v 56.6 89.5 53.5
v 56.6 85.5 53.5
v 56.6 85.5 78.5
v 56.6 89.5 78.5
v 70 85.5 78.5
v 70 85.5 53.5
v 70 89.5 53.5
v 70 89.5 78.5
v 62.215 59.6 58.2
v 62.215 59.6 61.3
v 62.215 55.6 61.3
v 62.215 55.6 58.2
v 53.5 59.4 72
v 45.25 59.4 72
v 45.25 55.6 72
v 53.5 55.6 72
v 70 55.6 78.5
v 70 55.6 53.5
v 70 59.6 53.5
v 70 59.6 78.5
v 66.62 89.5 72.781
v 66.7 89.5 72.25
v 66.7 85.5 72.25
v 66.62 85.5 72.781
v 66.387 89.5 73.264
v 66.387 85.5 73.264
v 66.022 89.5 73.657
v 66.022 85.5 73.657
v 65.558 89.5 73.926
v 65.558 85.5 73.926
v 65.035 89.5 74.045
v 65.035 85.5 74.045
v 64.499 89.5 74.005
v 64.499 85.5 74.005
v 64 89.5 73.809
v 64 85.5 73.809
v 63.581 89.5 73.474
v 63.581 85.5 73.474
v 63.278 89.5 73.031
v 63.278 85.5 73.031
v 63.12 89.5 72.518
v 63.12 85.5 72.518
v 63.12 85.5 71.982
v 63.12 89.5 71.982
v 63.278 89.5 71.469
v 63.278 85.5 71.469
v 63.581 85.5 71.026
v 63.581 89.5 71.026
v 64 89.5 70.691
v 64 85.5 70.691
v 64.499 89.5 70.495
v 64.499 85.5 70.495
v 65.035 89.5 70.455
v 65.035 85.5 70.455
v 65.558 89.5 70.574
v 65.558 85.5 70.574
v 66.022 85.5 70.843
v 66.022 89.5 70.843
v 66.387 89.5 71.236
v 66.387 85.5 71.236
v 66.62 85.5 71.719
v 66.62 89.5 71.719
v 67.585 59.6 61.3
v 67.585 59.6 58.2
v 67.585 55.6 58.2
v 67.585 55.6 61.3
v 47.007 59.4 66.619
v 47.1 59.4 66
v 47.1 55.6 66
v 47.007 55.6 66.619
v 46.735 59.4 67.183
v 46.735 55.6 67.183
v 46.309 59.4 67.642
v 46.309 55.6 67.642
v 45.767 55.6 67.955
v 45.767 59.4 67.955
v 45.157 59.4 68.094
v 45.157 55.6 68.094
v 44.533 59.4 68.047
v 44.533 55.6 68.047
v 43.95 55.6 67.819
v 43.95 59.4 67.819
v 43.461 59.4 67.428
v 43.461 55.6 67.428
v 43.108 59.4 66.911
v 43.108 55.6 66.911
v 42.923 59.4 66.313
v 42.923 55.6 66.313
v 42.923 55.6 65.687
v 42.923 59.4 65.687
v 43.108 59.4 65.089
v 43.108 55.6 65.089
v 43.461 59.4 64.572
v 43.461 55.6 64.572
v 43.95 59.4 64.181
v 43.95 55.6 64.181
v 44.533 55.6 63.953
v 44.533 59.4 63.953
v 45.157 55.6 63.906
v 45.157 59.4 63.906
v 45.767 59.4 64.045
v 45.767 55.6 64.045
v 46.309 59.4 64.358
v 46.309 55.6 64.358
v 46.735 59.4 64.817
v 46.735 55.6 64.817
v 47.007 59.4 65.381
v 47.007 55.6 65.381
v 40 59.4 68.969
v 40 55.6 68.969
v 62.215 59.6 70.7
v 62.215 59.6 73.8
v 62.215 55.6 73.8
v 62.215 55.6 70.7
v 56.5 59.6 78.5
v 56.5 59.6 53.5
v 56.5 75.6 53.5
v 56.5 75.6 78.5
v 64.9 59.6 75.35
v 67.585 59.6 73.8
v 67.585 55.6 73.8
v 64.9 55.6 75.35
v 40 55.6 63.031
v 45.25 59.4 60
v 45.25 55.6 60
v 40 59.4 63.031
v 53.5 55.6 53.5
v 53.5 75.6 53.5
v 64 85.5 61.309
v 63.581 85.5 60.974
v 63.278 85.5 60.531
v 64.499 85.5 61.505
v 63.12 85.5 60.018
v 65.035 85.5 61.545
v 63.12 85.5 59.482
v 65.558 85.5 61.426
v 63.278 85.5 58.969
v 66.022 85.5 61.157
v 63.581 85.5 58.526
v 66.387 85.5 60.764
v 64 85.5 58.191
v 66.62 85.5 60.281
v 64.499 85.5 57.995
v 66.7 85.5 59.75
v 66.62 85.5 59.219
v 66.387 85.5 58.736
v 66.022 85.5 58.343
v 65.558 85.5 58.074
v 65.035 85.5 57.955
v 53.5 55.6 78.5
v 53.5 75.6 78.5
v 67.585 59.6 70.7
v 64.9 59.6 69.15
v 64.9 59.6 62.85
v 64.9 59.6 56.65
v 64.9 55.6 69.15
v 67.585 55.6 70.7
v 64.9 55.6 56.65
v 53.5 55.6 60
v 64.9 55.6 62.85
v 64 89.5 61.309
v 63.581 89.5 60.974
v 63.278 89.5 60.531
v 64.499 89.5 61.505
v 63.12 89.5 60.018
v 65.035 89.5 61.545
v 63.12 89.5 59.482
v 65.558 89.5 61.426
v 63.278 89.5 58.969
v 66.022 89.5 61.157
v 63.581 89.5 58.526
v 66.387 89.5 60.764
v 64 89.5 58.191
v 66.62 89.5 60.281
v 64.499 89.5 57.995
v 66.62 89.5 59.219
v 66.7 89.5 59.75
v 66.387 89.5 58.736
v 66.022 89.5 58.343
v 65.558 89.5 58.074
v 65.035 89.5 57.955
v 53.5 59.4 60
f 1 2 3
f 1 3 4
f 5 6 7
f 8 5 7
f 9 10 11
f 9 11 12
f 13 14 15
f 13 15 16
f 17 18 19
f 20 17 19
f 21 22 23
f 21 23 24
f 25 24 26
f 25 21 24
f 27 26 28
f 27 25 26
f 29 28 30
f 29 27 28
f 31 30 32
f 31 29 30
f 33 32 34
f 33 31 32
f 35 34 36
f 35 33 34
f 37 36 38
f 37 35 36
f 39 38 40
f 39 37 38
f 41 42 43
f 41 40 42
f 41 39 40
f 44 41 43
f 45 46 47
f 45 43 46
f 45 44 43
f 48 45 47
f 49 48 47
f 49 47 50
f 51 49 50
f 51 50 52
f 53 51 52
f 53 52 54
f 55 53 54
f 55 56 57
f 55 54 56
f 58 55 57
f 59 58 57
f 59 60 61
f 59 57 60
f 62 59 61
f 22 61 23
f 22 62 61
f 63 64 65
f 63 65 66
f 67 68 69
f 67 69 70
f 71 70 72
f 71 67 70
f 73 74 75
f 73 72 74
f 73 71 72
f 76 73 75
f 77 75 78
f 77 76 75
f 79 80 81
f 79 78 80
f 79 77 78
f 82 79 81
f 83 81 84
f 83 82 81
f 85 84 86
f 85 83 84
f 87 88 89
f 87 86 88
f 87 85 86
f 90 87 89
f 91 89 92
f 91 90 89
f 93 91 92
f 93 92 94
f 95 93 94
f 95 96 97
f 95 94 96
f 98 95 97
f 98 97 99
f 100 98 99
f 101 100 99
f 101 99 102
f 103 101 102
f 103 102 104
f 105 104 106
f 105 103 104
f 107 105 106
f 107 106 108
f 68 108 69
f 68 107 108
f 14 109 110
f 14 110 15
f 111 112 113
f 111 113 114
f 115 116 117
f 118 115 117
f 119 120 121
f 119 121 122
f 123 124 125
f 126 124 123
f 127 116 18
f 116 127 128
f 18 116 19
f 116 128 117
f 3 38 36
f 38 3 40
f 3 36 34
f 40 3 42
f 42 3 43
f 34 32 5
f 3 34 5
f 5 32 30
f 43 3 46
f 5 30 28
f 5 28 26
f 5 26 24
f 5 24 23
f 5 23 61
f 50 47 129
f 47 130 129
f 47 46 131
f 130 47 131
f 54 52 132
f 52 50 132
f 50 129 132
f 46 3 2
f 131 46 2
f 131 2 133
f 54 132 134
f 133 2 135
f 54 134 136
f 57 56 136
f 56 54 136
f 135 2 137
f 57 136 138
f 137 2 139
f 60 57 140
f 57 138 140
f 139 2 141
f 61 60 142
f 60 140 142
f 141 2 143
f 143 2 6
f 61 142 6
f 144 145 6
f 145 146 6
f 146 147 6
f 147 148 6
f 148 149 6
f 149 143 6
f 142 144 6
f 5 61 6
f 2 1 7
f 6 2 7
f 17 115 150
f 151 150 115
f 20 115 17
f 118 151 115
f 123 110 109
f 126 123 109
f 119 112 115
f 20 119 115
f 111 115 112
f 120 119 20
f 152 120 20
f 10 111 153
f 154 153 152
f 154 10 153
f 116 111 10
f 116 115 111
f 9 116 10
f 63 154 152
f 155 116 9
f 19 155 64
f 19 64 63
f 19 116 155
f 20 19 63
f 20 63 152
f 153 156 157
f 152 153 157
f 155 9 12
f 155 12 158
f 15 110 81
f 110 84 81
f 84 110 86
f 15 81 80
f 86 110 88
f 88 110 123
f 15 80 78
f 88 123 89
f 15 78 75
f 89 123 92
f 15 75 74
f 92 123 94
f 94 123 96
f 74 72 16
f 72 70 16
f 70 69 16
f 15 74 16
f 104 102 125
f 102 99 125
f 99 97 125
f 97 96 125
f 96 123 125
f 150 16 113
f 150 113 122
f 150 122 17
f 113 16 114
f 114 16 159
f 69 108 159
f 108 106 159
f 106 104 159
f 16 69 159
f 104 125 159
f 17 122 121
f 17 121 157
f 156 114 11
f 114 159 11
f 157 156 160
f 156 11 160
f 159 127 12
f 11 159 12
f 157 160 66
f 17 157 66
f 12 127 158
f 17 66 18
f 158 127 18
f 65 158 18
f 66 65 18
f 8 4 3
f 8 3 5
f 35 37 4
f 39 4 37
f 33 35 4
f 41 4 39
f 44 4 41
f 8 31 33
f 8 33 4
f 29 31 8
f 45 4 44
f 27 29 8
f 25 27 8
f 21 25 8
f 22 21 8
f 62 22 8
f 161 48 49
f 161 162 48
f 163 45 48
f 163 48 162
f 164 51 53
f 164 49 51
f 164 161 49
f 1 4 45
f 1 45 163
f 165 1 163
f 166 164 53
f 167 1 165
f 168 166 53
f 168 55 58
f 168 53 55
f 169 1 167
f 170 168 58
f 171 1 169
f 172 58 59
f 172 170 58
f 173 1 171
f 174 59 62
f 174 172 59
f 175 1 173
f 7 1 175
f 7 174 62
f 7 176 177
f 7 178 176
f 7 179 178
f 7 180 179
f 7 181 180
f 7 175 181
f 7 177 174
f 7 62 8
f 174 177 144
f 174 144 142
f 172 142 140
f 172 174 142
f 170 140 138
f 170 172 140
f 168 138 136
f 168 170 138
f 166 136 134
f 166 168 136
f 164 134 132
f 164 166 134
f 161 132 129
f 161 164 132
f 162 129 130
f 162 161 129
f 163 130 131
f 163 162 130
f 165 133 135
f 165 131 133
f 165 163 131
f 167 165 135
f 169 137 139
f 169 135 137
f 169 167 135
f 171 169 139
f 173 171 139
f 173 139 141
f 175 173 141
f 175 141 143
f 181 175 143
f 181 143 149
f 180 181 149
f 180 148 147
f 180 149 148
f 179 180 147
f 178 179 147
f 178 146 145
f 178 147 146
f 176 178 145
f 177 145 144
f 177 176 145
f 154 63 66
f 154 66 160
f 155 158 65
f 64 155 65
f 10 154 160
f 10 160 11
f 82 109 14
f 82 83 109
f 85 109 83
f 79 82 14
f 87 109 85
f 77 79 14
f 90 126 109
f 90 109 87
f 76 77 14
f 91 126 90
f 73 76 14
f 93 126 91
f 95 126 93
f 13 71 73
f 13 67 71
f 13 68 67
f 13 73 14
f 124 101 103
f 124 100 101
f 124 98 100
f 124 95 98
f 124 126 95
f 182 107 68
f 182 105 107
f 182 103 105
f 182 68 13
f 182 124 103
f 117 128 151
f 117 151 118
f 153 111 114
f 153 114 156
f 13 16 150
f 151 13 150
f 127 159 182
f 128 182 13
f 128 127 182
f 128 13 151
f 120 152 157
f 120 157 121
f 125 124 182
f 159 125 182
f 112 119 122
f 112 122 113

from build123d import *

# Parameters (mm, degrees)
PRISM018_DEPTH       = 13
PRISM019_DEPTH       = 13
PRISM020_DEPTH       = 6
PRISM020_ROLL_ANGLE  = 90
PRISM020_PITCH_ANGLE = 30.000006
CYLINDER016_R        = 1.8
CYLINDER016_DEPTH    = 6
PRISM021_DEPTH       = 6
PRISM021_ROLL_ANGLE  = 90
PRISM021_PITCH_ANGLE = 30.000006
CYLINDER017_R        = 1.8
CYLINDER017_DEPTH    = 6
CYLINDER015_R        = 2.1
CYLINDER015_DEPTH    = 13
CUBE025_W            = 3
CUBE025_H            = 20
CUBE025_DEPTH        = 25
CUBE026_W            = 15
CUBE026_H            = 4
CUBE026_DEPTH        = 25
CUBE027_W            = 13.4
CUBE027_H            = 4
CUBE027_DEPTH        = 25
CUBE024_W            = 15
CUBE024_H            = 3.8
CUBE024_DEPTH        = 12


with BuildPart() as prism018:
    # prism018 → prism018 (new body)
    with BuildSketch(Plane(origin=(40, 64, 72), x_dir=(1, 0, 0), z_dir=(0, -1, 0))):
        Polygon((5.25, 0), (-2.625, 4.546633), (-2.625, -4.546633), align=None)
    extrude(amount=PRISM018_DEPTH)


with BuildPart() as prism019:
    # prism019 → prism019 (new body)
    with BuildSketch(Plane(origin=(40, 64, 60), x_dir=(1, 0, 0), z_dir=(0, -1, 0))):
        Polygon((5.25, 0), (-2.625, 4.546633), (-2.625, -4.546633), align=None)
    extrude(amount=PRISM019_DEPTH)


with BuildPart() as prism020:
    # prism020 → prism020 (new body)
    with BuildSketch(Plane.XY):
        Polygon((3.1, 0), (1.55, 2.684679), (-1.55, 2.684679), (-3.1, 0), (-1.55, -2.684679), (1.55, -2.684679), align=None)
    extrude(amount=PRISM020_DEPTH)


with BuildPart() as prism020_1:
    # prism020 roll: moved
    add(prism020.part.rotate(Axis((0, 0, 0), (1, 0, 0)), PRISM020_ROLL_ANGLE))


with BuildPart() as prism020_2:
    # prism020 pitch: moved
    add(prism020_1.part.rotate(Axis((0, 0, 0), (0, 1, 0)), PRISM020_PITCH_ANGLE))


with BuildPart() as prism020_3:
    # prism020 placement: moved
    add(prism020_2.part.moved(Location((64.9, 60.499999, 72.25))))


with BuildPart() as cylinder016:
    # cylinder016 → cylinder016 (new body)
    with BuildSketch(Plane(origin=(64.9, 90.5, 72.25), x_dir=(1, 0, 0), z_dir=(0, -1, 0))):
        Circle(CYLINDER016_R)
    extrude(amount=CYLINDER016_DEPTH)


with BuildPart() as prism021:
    # prism021 → prism021 (new body)
    with BuildSketch(Plane.XY):
        Polygon((3.1, 0), (1.55, 2.684679), (-1.55, 2.684679), (-3.1, 0), (-1.55, -2.684679), (1.55, -2.684679), align=None)
    extrude(amount=PRISM021_DEPTH)


with BuildPart() as prism021_1:
    # prism021 roll: moved
    add(prism021.part.rotate(Axis((0, 0, 0), (1, 0, 0)), PRISM021_ROLL_ANGLE))


with BuildPart() as prism021_2:
    # prism021 pitch: moved
    add(prism021_1.part.rotate(Axis((0, 0, 0), (0, 1, 0)), PRISM021_PITCH_ANGLE))


with BuildPart() as prism021_3:
    # prism021 placement: moved
    add(prism021_2.part.moved(Location((64.9, 60.499999, 59.75))))


with BuildPart() as cylinder017:
    # cylinder017 → cylinder017 (new body)
    with BuildSketch(Plane(origin=(64.9, 90.5, 59.75), x_dir=(1, 0, 0), z_dir=(0, -1, 0))):
        Circle(CYLINDER017_R)
    extrude(amount=CYLINDER017_DEPTH)


with BuildPart() as group011:
    # cylinder015 → cylinder015 (new body)
    with BuildSketch(Plane(origin=(45, 64, 66), x_dir=(1, 0, 0), z_dir=(0, -1, 0))):
        Circle(CYLINDER015_R)
    extrude(amount=CYLINDER015_DEPTH)

    # Group011: union prism018, prism019, prism020, cylinder016, prism021, cylinder017
    add(prism018.part)
    add(prism019.part)
    add(prism020_3.part)
    add(cylinder016.part)
    add(prism021_3.part)
    add(cylinder017.part)


with BuildPart() as cube025:
    # cube025 → cube025 (new body)
    with BuildSketch(Plane(origin=(53.5, 55.6, 53.5), x_dir=(1, 0, 0), z_dir=(0, 0, 1))):
        with Locations((1.5, 10)):
            Rectangle(CUBE025_W, CUBE025_H)
    extrude(amount=CUBE025_DEPTH)


with BuildPart() as cube026:
    # cube026 → cube026 (new body)
    with BuildSketch(Plane(origin=(55, 55.6, 53.5), x_dir=(1, 0, 0), z_dir=(0, 0, 1))):
        with Locations((7.5, 2)):
            Rectangle(CUBE026_W, CUBE026_H)
    extrude(amount=CUBE026_DEPTH)


with BuildPart() as cube027:
    # cube027 → cube027 (new body)
    with BuildSketch(Plane(origin=(56.6, 85.5, 53.5), x_dir=(1, 0, 0), z_dir=(0, 0, 1))):
        with Locations((6.7, 2)):
            Rectangle(CUBE027_W, CUBE027_H)
    extrude(amount=CUBE027_DEPTH)


with BuildPart() as manipulator001:
    # cube024 → cube024 (new body)
    with BuildSketch(Plane(origin=(40, 55.6, 60), x_dir=(1, 0, 0), z_dir=(0, 0, 1))):
        with Locations((7.5, 1.9)):
            Rectangle(CUBE024_W, CUBE024_H)
    extrude(amount=CUBE024_DEPTH)

    # Group010: union cube025, cube026, cube027
    add(cube025.part)
    add(cube026.part)
    add(cube027.part)

    # difference006: cut Group011
    add(group011.part, mode=Mode.SUBTRACT)


solid = manipulator001.part
